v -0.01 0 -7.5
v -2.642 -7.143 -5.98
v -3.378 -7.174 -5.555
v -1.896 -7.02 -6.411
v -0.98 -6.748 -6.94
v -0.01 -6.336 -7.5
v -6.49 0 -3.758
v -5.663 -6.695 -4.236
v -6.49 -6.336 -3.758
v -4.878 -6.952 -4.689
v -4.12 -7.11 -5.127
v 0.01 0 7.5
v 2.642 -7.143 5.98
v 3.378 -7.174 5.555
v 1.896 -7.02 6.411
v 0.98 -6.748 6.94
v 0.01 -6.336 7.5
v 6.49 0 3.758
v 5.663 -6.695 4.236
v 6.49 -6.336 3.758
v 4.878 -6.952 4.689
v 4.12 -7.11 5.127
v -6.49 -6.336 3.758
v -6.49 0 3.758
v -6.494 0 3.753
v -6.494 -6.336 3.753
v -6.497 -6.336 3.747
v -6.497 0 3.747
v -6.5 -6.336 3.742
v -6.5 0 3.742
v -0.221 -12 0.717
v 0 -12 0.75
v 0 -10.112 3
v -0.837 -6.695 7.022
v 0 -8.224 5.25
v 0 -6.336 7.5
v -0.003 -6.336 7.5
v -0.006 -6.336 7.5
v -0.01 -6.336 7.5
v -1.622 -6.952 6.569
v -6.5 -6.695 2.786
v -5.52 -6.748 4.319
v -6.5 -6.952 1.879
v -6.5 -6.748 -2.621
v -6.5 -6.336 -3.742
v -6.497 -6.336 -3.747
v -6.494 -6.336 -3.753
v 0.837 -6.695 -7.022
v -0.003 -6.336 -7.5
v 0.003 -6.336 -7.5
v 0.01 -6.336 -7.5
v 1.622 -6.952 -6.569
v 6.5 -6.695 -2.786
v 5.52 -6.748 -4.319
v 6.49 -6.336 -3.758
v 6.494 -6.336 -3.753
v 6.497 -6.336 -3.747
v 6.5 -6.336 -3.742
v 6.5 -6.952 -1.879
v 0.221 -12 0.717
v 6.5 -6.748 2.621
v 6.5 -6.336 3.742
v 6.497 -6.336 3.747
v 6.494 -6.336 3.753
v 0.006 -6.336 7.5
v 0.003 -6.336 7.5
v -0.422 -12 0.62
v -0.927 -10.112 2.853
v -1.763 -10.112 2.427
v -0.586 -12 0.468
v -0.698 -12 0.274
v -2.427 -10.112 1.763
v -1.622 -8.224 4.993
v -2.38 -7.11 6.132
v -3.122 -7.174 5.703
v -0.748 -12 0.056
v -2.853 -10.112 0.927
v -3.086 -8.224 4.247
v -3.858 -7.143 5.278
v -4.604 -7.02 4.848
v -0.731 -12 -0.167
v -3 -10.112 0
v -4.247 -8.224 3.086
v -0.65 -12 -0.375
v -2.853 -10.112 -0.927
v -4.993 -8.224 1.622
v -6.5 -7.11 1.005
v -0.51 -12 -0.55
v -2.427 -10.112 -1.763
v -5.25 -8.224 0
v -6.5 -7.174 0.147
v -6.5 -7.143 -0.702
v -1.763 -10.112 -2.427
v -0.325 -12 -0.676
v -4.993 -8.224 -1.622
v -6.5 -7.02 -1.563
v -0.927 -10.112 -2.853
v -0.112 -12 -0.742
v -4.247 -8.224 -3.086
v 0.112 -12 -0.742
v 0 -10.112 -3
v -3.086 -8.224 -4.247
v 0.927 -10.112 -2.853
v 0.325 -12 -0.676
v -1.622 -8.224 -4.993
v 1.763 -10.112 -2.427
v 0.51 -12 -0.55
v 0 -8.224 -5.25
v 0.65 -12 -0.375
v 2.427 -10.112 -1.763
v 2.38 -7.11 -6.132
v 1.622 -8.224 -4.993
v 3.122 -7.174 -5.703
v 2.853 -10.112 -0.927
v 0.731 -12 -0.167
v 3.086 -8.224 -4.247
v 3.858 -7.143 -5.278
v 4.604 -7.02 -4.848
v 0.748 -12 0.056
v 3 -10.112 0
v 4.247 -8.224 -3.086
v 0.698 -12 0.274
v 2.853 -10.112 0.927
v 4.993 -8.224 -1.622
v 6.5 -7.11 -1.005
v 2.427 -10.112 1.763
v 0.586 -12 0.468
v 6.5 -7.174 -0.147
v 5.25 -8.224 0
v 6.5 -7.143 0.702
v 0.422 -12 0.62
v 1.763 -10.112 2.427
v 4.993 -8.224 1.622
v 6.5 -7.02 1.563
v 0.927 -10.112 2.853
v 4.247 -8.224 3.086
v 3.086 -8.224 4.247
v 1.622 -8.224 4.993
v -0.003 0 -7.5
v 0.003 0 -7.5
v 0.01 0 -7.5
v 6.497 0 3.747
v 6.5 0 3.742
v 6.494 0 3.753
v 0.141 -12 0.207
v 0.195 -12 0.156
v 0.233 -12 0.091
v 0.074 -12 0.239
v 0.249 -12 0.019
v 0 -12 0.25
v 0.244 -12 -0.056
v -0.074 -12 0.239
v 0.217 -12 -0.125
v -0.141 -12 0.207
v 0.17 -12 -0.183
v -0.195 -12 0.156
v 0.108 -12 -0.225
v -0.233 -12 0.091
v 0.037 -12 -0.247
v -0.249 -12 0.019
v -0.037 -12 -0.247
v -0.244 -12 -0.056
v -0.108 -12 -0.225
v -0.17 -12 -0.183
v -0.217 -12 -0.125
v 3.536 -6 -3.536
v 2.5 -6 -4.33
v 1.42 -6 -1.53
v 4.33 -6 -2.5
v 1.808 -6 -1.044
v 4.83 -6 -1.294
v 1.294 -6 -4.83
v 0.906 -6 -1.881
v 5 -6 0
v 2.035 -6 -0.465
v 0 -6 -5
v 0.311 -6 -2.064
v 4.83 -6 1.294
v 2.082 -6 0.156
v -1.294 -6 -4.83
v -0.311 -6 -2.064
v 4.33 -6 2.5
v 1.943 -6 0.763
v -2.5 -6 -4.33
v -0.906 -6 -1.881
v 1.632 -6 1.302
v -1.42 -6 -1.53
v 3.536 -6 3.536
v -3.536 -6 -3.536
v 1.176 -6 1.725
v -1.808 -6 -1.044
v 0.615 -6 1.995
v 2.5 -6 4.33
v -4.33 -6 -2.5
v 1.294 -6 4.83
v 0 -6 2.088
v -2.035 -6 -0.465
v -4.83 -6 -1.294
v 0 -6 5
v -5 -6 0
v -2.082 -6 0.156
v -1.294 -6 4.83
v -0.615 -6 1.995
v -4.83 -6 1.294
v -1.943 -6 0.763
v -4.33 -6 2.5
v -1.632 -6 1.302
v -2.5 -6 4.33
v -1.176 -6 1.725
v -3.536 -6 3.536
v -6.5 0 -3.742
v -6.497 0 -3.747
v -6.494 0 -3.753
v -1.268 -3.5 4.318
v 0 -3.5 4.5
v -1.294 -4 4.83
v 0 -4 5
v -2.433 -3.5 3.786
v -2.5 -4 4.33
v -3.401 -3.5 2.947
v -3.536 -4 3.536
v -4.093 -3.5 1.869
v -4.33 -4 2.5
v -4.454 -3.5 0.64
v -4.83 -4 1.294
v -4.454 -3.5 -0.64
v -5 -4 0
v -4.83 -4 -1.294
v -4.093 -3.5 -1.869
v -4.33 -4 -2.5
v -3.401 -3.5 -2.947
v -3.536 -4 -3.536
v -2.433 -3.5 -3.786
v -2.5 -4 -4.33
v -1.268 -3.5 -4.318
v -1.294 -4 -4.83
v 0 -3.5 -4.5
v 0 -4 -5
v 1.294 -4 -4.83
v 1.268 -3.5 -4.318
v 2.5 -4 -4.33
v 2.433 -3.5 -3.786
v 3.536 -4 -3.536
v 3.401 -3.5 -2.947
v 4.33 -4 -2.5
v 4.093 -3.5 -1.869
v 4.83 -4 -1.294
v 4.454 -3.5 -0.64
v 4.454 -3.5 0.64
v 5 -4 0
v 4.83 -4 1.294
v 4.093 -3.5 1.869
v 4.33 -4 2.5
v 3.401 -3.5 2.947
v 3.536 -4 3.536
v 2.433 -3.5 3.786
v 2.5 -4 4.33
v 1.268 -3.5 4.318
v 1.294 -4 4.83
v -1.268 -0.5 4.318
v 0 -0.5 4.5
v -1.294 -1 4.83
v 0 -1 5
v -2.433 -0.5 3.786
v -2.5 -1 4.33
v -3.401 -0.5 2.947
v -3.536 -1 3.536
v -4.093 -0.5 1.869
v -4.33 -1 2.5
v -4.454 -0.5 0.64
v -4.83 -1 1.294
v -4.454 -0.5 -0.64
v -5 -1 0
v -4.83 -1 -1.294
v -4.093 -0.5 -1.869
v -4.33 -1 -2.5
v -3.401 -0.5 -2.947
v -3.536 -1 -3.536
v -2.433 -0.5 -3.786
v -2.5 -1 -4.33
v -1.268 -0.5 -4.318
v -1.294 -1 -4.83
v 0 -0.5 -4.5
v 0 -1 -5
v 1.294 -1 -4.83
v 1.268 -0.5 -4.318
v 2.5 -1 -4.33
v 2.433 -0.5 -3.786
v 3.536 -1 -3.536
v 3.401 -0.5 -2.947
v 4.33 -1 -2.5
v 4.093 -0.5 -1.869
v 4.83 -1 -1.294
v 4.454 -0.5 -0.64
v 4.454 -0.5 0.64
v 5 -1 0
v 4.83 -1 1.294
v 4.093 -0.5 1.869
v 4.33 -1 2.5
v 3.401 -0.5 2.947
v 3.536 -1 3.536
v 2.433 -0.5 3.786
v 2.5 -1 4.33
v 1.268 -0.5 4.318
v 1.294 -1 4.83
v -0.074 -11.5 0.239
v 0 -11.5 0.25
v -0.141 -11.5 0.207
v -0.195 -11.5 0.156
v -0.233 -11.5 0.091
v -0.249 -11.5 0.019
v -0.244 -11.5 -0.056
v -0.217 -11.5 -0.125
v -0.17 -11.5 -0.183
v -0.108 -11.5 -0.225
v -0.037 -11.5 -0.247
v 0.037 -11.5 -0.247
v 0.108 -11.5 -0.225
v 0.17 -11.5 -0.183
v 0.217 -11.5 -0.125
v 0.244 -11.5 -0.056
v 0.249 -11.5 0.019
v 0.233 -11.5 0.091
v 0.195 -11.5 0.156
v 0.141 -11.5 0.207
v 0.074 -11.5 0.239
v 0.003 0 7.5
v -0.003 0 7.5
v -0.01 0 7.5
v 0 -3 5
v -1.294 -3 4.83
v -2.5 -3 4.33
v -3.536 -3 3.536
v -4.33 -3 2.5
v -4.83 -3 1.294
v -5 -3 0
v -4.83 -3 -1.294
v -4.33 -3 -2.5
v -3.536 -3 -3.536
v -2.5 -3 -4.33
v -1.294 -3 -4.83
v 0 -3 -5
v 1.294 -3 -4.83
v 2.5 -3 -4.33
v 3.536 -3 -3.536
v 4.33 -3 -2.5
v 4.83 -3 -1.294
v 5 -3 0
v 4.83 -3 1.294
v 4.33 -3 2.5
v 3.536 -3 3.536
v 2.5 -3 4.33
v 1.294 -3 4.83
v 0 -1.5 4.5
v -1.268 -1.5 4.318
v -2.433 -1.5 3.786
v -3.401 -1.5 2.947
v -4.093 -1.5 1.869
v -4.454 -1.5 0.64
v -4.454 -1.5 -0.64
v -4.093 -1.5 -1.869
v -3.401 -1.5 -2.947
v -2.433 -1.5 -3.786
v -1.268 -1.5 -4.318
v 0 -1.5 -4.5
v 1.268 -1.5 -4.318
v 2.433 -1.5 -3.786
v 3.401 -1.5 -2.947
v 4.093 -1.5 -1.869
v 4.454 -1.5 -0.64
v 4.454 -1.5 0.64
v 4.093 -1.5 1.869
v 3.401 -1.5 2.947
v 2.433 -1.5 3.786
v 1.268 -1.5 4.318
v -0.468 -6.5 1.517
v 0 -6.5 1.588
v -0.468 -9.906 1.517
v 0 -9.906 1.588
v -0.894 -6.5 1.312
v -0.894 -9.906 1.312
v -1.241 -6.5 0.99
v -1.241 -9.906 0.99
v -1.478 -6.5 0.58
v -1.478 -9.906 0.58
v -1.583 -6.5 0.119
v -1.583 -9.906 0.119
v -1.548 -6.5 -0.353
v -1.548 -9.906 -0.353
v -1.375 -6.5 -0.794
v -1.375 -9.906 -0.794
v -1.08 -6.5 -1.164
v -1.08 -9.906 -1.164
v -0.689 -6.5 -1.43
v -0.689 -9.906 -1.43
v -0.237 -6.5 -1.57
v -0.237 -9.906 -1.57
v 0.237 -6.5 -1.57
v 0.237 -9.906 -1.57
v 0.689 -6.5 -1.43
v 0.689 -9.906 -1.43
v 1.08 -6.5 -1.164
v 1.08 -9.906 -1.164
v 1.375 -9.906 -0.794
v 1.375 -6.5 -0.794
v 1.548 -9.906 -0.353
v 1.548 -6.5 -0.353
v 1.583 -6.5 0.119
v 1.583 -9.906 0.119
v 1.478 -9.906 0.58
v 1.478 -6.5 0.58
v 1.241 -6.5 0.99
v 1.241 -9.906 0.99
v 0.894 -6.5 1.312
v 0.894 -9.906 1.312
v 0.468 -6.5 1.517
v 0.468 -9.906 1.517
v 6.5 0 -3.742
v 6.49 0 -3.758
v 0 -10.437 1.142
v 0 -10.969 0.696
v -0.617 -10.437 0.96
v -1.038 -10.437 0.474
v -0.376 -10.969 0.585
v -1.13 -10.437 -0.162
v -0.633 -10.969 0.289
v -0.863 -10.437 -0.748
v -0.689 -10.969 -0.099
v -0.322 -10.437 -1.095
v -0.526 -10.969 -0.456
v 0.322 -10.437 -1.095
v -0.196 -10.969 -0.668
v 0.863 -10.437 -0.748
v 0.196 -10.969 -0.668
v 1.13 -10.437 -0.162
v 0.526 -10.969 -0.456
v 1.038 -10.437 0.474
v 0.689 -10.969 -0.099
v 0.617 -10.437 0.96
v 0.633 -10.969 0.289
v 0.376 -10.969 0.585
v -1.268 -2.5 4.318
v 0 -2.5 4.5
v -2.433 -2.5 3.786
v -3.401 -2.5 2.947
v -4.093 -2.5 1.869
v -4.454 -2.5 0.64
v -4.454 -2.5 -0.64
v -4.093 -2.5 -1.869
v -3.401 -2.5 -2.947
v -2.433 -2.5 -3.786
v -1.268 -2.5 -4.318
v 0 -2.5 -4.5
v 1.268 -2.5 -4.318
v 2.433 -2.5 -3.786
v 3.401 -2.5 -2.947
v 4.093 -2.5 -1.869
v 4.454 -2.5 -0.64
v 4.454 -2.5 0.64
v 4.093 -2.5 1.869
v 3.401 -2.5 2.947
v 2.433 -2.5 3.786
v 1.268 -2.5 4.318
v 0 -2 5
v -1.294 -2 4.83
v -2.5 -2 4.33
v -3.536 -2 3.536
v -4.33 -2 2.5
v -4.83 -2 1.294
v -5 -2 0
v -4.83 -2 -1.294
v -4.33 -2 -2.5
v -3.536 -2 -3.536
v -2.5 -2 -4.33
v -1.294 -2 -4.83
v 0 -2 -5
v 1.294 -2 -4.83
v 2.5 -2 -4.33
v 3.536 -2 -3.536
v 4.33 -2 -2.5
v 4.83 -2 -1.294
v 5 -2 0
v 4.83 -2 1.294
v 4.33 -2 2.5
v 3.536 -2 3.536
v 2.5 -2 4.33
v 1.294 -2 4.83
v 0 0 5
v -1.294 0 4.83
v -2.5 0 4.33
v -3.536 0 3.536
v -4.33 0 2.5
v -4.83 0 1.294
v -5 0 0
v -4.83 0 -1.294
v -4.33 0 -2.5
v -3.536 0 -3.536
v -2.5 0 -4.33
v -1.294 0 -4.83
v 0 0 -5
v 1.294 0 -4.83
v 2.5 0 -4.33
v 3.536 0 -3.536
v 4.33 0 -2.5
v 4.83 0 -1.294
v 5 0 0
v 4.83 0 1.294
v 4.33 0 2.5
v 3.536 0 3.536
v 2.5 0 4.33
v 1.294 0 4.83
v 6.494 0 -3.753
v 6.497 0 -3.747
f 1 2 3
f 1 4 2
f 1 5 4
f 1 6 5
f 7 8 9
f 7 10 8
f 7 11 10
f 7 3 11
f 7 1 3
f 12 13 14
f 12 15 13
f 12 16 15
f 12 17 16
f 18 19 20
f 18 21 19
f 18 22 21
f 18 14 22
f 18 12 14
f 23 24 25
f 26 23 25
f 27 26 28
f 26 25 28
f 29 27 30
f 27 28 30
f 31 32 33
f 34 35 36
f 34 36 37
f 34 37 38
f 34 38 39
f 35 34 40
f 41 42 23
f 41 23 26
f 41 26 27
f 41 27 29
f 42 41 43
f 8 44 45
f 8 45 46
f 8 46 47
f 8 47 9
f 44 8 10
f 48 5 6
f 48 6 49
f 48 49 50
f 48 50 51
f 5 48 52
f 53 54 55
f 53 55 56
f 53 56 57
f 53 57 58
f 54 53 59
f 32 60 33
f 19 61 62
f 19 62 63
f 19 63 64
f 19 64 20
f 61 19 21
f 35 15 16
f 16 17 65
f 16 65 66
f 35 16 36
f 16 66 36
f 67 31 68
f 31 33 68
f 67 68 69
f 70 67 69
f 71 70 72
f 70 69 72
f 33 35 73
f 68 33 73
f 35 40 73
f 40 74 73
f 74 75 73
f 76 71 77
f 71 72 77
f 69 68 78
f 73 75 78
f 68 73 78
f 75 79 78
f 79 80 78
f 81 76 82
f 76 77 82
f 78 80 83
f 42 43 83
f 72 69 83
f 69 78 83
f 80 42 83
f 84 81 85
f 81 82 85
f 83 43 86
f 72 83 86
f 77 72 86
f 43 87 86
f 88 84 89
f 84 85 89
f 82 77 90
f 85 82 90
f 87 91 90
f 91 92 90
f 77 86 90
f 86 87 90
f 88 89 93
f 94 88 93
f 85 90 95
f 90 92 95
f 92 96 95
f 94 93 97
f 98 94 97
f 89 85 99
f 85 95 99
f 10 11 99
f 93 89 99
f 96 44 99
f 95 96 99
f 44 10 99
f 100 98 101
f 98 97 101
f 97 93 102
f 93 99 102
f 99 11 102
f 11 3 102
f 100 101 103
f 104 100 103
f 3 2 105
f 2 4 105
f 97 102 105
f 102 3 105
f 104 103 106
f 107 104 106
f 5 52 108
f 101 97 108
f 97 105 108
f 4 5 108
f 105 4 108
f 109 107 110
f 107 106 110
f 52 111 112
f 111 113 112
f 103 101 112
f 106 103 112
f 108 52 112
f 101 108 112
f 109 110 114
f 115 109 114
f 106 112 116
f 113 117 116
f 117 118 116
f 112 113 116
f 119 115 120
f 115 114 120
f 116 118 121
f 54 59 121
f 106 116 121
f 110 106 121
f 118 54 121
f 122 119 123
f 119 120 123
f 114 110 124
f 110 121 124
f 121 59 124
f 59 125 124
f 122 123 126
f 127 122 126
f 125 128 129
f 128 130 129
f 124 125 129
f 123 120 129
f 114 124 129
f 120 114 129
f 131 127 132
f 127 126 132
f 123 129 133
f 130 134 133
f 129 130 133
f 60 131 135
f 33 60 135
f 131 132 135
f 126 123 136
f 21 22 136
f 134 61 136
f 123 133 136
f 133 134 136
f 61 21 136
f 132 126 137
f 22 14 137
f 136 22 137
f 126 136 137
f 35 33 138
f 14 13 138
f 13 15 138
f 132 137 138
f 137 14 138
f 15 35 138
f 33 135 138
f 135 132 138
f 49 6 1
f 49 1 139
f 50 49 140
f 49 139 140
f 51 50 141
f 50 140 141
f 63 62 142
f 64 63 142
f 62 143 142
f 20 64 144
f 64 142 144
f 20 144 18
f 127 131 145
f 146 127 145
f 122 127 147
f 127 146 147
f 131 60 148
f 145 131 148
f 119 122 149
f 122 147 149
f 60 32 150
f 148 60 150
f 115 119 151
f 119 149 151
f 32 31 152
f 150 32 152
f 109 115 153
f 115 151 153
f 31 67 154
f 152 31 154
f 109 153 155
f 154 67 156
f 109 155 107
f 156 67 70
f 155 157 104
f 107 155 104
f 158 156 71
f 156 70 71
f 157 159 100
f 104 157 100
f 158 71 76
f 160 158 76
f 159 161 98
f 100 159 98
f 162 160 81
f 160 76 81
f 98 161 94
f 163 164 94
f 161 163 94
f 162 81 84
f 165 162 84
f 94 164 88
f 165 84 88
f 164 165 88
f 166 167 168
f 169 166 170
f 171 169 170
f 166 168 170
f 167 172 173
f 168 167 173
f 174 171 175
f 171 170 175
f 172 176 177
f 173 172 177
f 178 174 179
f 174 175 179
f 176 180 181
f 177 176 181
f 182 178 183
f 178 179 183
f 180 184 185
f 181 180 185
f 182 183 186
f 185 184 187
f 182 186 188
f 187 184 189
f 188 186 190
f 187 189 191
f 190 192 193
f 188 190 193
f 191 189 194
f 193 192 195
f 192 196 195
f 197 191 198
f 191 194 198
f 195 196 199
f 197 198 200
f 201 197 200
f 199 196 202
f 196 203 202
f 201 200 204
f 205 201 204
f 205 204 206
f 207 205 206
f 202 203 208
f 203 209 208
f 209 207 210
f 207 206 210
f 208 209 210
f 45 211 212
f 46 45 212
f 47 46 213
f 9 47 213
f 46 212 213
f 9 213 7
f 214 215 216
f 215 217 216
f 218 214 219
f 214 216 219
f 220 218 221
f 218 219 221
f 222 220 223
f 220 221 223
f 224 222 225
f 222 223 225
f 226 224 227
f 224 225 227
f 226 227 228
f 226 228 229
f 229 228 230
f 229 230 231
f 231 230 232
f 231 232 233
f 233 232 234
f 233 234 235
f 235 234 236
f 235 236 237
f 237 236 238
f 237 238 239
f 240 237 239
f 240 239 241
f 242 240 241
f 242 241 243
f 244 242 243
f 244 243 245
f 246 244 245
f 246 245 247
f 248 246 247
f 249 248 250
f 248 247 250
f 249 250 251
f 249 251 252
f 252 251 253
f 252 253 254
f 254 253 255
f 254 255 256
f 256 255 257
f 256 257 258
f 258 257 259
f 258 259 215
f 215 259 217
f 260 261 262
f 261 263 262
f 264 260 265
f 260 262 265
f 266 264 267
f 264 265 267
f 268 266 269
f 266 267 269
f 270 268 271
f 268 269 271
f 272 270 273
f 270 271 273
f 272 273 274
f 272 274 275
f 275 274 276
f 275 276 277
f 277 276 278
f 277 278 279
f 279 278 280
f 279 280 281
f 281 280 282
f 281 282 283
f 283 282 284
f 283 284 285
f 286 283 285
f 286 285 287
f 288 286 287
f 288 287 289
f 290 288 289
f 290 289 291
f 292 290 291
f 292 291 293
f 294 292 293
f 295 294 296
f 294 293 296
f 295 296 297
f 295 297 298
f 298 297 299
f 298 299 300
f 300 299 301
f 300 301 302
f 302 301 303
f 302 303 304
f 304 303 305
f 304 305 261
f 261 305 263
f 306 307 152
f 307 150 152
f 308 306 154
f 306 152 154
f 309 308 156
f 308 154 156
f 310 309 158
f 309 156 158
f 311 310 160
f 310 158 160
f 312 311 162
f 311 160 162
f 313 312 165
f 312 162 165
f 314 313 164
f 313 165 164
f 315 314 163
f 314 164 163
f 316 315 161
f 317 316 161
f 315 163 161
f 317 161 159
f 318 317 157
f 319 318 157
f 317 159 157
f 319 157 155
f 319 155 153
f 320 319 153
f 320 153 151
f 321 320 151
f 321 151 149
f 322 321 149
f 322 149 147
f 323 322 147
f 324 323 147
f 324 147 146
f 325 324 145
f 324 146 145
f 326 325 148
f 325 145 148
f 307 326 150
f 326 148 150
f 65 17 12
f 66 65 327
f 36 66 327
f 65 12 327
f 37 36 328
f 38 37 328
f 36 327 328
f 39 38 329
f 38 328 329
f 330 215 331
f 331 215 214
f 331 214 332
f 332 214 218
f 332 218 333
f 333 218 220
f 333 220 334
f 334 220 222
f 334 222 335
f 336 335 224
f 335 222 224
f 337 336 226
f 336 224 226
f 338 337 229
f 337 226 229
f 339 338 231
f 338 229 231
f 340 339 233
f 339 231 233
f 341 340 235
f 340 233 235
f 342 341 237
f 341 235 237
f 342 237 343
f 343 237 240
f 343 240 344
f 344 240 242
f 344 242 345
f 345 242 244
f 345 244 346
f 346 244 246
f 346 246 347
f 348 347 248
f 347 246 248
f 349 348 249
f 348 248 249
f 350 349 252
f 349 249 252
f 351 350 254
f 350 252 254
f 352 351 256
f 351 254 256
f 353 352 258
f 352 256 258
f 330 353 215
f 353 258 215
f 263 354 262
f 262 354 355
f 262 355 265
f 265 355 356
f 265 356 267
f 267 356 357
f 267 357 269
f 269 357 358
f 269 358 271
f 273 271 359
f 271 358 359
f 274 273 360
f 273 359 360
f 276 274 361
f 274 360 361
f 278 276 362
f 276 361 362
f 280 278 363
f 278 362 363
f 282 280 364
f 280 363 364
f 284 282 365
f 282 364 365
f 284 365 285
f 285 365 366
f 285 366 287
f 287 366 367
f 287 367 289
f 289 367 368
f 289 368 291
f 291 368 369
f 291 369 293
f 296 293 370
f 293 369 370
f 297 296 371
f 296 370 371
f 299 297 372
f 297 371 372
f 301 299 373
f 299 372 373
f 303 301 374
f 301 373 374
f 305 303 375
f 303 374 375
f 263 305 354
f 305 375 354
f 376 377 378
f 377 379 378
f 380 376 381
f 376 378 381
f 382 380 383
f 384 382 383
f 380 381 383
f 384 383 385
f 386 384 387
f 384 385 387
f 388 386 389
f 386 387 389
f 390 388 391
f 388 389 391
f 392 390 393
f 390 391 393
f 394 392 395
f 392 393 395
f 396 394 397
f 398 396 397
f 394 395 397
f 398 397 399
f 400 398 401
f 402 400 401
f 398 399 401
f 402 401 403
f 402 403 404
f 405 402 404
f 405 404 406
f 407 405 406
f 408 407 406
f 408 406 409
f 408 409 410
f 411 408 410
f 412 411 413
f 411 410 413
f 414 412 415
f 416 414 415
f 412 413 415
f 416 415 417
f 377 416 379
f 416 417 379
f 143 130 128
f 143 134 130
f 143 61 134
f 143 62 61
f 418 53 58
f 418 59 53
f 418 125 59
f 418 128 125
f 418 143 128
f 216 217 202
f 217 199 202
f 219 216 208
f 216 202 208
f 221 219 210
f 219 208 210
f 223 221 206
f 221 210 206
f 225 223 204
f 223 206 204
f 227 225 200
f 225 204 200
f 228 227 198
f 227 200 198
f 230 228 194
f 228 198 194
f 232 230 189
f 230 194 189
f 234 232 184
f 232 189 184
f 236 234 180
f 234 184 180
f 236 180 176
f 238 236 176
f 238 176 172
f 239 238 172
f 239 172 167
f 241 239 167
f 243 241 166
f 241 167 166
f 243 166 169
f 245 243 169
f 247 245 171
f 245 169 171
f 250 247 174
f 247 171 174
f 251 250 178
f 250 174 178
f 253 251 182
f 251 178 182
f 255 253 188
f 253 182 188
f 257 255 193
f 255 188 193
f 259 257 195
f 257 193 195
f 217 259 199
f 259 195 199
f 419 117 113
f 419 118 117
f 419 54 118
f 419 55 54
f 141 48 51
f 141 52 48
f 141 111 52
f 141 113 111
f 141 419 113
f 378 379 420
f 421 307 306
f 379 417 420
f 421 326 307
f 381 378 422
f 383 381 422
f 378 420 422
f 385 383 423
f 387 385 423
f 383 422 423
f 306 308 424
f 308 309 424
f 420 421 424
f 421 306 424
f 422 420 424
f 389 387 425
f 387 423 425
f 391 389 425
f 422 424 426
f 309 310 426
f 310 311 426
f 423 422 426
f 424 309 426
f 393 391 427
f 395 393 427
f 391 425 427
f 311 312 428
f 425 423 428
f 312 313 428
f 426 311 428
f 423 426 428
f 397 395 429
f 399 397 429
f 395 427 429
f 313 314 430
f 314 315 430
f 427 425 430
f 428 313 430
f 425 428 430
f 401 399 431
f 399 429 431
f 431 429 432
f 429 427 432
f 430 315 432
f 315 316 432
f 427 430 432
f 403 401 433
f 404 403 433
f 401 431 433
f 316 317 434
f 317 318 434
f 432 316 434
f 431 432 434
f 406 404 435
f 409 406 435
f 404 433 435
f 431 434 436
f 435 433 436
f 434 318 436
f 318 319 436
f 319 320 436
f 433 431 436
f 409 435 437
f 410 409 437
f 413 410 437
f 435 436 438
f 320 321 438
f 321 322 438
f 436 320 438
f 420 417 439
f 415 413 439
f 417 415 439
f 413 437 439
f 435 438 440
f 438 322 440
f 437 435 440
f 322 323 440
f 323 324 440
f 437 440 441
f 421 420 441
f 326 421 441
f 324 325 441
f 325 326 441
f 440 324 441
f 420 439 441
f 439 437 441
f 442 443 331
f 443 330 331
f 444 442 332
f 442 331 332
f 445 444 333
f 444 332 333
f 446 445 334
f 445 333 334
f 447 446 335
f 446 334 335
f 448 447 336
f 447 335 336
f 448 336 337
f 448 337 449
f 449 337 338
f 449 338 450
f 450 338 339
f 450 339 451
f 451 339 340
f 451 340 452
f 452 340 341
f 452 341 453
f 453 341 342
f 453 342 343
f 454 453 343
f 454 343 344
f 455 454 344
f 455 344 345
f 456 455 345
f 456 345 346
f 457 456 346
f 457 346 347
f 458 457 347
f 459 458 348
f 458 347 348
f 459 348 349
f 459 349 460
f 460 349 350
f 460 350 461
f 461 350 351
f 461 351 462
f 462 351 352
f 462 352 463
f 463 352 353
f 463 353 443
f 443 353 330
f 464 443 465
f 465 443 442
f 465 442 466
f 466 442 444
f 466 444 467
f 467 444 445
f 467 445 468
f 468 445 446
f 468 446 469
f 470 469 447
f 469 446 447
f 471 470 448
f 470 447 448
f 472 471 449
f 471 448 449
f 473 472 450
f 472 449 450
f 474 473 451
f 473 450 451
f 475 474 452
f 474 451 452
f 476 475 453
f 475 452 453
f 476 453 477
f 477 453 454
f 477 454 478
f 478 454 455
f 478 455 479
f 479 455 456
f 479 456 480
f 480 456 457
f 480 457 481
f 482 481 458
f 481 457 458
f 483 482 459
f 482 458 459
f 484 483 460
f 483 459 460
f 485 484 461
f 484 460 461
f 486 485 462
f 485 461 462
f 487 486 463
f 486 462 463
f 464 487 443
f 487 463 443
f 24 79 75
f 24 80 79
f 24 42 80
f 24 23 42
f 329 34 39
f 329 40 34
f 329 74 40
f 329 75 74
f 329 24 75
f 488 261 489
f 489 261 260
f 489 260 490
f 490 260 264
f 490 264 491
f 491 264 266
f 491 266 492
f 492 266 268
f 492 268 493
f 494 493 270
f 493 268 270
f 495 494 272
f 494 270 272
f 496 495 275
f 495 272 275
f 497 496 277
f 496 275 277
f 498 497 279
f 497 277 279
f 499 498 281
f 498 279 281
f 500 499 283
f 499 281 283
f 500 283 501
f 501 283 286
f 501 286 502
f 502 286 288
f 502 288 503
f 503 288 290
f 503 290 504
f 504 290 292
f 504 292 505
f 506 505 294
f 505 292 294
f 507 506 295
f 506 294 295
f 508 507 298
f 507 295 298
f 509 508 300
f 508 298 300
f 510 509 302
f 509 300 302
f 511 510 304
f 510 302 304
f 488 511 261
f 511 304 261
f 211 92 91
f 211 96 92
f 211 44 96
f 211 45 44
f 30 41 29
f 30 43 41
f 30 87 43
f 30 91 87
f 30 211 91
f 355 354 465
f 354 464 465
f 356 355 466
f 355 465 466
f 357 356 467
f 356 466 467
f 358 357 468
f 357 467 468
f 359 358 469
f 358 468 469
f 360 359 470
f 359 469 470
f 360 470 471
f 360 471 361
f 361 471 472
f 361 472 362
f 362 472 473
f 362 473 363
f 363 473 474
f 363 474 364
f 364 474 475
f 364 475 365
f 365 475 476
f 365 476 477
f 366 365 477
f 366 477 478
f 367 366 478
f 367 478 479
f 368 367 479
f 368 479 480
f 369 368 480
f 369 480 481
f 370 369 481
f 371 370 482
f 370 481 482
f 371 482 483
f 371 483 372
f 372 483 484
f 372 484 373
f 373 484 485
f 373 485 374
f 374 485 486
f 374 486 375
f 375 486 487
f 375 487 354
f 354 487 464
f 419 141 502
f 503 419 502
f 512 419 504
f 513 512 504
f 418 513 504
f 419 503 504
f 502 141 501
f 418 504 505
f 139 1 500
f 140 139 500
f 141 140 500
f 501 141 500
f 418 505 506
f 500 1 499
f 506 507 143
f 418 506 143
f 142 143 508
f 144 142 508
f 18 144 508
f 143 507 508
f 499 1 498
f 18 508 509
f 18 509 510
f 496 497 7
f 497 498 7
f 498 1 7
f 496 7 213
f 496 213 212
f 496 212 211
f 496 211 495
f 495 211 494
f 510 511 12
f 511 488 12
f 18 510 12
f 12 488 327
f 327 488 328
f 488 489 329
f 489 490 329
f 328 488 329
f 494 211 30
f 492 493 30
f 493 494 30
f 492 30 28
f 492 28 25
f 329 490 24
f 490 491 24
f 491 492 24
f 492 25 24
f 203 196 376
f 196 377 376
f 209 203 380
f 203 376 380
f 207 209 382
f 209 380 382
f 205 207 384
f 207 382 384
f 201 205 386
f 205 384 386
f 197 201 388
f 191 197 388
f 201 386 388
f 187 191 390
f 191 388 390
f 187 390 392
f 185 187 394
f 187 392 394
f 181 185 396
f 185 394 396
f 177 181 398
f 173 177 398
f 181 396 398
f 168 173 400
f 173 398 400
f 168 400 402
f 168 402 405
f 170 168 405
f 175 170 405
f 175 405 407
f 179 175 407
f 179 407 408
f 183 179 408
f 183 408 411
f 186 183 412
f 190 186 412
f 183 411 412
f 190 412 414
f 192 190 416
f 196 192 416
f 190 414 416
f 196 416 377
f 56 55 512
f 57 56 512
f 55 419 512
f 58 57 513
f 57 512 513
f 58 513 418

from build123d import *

# Parameters (mm, degrees)
SKETCH2_OUTSIDE_W  = 21.874
SKETCH2_OUTSIDE_H  = 21.874
CUT_EXTRUDE1_DEPTH = 13


with BuildPart() as part:
    # Sketch1 → Revolve1 (revolve)
    with BuildSketch(Plane.XY, mode=Mode.PRIVATE) as revolve1_sk:
        Polygon((0.25, -12), (0.75, -12), (7.5, -6.33607749), (7.5, 0), (5, 0), (4.5, -0.5), (5, -1), (4.5, -1.5), (5, -2), (4.5, -2.5), (5, -3), (4.5, -3.5), (5, -4), (5, -6), (2.0875, -6), (1.5875, -6.5), (1.5875, -9.90602957), (0.25, -11.5), align=None)
    revolve(revolve1_sk.sketch.rotate(Axis((0, 0, 0), (0, -1, 0)), 90), axis=Axis((0, 0, 0), (0, -1, 0)))  # turned: the seam where the file's is

    # Sketch2 outside → Cut-Extrude1 (cut, through all)
    with BuildSketch(Plane(origin=(0, 0, 0), x_dir=(1, 0, 0), z_dir=(0, 1, 0))):
        Rectangle(SKETCH2_OUTSIDE_W, SKETCH2_OUTSIDE_H)
        Polygon((0, 7.505553499), (-6.5, 3.75277675), (-6.5, -3.75277675), (0, -7.505553499), (6.5, -3.75277675), (6.5, 3.75277675), align=None, mode=Mode.SUBTRACT)
    extrude(amount=-CUT_EXTRUDE1_DEPTH, mode=Mode.SUBTRACT)


solid = part.part
